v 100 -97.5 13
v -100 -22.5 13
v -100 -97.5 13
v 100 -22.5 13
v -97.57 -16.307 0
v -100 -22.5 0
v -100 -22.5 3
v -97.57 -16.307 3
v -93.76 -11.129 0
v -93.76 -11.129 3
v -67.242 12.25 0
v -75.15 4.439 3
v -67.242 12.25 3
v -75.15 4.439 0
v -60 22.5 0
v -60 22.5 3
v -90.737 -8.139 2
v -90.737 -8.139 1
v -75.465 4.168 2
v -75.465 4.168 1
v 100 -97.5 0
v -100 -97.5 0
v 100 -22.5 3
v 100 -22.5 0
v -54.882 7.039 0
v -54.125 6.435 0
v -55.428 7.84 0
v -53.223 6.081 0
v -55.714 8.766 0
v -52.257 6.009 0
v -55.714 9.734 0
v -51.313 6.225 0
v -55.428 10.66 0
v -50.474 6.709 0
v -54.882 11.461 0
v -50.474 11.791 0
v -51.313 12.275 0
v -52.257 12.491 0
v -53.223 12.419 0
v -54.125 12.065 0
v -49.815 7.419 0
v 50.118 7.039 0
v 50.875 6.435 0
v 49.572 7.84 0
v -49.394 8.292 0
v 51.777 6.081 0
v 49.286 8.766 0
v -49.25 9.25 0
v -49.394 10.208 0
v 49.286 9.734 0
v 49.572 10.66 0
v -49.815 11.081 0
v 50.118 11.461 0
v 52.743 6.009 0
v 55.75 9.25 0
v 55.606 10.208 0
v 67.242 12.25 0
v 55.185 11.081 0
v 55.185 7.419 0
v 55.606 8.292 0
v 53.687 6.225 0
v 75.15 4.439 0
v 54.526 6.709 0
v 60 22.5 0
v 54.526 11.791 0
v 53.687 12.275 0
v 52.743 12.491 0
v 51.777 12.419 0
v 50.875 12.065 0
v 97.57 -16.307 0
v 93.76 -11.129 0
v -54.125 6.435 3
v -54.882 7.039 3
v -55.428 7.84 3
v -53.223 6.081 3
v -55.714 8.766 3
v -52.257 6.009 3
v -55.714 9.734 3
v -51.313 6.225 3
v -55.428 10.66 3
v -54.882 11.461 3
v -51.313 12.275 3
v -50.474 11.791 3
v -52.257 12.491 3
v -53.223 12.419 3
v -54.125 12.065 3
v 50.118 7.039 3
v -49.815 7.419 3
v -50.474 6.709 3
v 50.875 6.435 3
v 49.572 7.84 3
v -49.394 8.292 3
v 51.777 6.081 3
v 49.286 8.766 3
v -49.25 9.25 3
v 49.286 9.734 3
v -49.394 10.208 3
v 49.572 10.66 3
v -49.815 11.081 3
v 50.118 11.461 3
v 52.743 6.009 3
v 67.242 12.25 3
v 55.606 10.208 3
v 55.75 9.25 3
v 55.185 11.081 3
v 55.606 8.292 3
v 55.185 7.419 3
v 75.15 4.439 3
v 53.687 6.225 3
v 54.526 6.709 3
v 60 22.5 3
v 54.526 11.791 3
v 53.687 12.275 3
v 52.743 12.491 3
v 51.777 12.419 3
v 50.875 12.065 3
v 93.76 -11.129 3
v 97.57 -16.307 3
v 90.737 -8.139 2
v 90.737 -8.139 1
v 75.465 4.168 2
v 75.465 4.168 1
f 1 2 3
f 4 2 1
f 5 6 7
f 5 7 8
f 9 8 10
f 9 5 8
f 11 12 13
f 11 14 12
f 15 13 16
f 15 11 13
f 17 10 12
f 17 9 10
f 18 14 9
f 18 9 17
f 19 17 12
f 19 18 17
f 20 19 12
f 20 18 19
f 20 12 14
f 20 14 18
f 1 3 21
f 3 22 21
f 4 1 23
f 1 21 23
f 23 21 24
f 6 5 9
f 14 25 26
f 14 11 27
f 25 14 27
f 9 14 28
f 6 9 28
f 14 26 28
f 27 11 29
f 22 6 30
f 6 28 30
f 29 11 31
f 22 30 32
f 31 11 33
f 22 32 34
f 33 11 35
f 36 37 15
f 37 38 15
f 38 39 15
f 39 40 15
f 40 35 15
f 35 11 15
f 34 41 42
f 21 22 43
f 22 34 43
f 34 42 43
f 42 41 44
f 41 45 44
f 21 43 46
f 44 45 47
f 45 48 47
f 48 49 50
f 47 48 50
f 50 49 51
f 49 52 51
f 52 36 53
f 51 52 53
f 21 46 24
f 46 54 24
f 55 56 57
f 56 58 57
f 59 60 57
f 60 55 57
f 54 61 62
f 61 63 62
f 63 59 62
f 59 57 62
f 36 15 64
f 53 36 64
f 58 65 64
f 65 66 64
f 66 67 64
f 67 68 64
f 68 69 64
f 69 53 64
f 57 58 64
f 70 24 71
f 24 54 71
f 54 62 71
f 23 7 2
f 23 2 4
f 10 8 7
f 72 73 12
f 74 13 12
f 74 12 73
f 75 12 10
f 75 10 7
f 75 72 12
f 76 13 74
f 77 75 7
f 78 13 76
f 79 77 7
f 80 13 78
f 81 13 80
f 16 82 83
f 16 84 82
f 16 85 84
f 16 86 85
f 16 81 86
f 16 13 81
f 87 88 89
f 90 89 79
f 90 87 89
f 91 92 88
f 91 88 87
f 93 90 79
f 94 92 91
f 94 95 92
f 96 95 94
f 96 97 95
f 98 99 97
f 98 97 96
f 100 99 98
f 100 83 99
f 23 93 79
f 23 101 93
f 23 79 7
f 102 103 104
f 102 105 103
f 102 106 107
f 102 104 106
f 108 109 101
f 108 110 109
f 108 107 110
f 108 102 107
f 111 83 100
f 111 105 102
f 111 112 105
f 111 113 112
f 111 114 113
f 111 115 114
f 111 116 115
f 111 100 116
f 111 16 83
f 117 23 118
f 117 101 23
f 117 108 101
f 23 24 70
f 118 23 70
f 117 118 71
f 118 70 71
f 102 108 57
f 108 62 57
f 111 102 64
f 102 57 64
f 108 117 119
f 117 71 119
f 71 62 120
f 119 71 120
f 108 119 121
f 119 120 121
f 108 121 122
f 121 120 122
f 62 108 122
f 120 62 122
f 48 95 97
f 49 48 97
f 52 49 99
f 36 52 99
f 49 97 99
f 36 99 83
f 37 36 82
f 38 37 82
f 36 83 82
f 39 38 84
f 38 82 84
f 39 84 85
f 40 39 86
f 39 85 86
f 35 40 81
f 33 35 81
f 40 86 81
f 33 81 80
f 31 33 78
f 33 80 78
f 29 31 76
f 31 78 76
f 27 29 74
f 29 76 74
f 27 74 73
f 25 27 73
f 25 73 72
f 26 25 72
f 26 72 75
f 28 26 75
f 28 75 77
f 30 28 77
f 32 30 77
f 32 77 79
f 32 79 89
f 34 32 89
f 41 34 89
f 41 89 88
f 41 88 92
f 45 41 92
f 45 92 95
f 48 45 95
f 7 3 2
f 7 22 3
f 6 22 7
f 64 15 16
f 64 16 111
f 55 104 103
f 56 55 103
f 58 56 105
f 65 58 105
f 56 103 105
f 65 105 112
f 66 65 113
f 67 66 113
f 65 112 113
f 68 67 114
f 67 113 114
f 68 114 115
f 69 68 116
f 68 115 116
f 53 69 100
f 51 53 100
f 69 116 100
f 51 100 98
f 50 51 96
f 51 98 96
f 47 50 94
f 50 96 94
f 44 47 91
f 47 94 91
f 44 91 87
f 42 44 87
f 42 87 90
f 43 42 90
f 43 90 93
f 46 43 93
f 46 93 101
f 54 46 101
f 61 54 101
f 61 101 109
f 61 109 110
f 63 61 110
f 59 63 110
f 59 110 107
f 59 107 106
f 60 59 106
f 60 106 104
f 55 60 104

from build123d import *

# Parameters (mm, degrees)
F0_W     = 120
F0_H     = 45
F0_H_2   = 75
F0_W_2   = 40
F1_DEPTH = 3
F2_W     = 200
F2_H     = 75
F3_DEPTH = 10
F4_R     = 3.25
F5_DEPTH = 25


with BuildPart() as f1:
    # F0 (on Top) → F1 (new body)
    with BuildSketch(Plane.XY):
        Rectangle(F0_W, F0_H)
        with BuildLine():
            Line((-100, -22.5), (-60, -22.5))
            Line((-60, -22.5), (-60, 22.5))
            add(Edge.make_bspline(
                [(-100, -22.5), (-95.680383, -4.419341), (-73.623309, -1.538), (-60, 22.5)],
                knots=[0, 0, 0, 0, 60.207973, 60.207973, 60.207973, 60.207973], degree=3))
        make_face()
        with Locations((0, -60)):
            Rectangle(F0_W, F0_H_2)
        with Locations((-80, -60)):
            Rectangle(F0_W_2, F0_H_2)
        with Locations((80, -60)):
            Rectangle(F0_W_2, F0_H_2)
        with BuildLine():
            Line((60, 22.5), (60, -22.5))
            Line((60, -22.5), (100, -22.5))
            add(Edge.make_bspline(
                [(100, -22.5), (95.680383, -4.419341), (73.623309, -1.538), (60, 22.5)],
                knots=[0, 0, 0, 0, 60.207973, 60.207973, 60.207973, 60.207973], degree=3))
        make_face()
    extrude(amount=F1_DEPTH)

    # F2 (on face) → F3 (join)
    with BuildSketch(Plane.XY.offset(3)):
        with Locations((0, -60)):
            Rectangle(F2_W, F2_H)
    extrude(amount=F3_DEPTH)

    # F4 (on face) → F5 (cut)
    with BuildSketch(Plane.XY.offset(3)):
        with Locations((-52.5, 9.25)):
            Circle(F4_R)
        with Locations((52.5, 9.25)):
            Circle(F4_R)
    extrude(amount=-F5_DEPTH, mode=Mode.SUBTRACT)


solid = f1.part
